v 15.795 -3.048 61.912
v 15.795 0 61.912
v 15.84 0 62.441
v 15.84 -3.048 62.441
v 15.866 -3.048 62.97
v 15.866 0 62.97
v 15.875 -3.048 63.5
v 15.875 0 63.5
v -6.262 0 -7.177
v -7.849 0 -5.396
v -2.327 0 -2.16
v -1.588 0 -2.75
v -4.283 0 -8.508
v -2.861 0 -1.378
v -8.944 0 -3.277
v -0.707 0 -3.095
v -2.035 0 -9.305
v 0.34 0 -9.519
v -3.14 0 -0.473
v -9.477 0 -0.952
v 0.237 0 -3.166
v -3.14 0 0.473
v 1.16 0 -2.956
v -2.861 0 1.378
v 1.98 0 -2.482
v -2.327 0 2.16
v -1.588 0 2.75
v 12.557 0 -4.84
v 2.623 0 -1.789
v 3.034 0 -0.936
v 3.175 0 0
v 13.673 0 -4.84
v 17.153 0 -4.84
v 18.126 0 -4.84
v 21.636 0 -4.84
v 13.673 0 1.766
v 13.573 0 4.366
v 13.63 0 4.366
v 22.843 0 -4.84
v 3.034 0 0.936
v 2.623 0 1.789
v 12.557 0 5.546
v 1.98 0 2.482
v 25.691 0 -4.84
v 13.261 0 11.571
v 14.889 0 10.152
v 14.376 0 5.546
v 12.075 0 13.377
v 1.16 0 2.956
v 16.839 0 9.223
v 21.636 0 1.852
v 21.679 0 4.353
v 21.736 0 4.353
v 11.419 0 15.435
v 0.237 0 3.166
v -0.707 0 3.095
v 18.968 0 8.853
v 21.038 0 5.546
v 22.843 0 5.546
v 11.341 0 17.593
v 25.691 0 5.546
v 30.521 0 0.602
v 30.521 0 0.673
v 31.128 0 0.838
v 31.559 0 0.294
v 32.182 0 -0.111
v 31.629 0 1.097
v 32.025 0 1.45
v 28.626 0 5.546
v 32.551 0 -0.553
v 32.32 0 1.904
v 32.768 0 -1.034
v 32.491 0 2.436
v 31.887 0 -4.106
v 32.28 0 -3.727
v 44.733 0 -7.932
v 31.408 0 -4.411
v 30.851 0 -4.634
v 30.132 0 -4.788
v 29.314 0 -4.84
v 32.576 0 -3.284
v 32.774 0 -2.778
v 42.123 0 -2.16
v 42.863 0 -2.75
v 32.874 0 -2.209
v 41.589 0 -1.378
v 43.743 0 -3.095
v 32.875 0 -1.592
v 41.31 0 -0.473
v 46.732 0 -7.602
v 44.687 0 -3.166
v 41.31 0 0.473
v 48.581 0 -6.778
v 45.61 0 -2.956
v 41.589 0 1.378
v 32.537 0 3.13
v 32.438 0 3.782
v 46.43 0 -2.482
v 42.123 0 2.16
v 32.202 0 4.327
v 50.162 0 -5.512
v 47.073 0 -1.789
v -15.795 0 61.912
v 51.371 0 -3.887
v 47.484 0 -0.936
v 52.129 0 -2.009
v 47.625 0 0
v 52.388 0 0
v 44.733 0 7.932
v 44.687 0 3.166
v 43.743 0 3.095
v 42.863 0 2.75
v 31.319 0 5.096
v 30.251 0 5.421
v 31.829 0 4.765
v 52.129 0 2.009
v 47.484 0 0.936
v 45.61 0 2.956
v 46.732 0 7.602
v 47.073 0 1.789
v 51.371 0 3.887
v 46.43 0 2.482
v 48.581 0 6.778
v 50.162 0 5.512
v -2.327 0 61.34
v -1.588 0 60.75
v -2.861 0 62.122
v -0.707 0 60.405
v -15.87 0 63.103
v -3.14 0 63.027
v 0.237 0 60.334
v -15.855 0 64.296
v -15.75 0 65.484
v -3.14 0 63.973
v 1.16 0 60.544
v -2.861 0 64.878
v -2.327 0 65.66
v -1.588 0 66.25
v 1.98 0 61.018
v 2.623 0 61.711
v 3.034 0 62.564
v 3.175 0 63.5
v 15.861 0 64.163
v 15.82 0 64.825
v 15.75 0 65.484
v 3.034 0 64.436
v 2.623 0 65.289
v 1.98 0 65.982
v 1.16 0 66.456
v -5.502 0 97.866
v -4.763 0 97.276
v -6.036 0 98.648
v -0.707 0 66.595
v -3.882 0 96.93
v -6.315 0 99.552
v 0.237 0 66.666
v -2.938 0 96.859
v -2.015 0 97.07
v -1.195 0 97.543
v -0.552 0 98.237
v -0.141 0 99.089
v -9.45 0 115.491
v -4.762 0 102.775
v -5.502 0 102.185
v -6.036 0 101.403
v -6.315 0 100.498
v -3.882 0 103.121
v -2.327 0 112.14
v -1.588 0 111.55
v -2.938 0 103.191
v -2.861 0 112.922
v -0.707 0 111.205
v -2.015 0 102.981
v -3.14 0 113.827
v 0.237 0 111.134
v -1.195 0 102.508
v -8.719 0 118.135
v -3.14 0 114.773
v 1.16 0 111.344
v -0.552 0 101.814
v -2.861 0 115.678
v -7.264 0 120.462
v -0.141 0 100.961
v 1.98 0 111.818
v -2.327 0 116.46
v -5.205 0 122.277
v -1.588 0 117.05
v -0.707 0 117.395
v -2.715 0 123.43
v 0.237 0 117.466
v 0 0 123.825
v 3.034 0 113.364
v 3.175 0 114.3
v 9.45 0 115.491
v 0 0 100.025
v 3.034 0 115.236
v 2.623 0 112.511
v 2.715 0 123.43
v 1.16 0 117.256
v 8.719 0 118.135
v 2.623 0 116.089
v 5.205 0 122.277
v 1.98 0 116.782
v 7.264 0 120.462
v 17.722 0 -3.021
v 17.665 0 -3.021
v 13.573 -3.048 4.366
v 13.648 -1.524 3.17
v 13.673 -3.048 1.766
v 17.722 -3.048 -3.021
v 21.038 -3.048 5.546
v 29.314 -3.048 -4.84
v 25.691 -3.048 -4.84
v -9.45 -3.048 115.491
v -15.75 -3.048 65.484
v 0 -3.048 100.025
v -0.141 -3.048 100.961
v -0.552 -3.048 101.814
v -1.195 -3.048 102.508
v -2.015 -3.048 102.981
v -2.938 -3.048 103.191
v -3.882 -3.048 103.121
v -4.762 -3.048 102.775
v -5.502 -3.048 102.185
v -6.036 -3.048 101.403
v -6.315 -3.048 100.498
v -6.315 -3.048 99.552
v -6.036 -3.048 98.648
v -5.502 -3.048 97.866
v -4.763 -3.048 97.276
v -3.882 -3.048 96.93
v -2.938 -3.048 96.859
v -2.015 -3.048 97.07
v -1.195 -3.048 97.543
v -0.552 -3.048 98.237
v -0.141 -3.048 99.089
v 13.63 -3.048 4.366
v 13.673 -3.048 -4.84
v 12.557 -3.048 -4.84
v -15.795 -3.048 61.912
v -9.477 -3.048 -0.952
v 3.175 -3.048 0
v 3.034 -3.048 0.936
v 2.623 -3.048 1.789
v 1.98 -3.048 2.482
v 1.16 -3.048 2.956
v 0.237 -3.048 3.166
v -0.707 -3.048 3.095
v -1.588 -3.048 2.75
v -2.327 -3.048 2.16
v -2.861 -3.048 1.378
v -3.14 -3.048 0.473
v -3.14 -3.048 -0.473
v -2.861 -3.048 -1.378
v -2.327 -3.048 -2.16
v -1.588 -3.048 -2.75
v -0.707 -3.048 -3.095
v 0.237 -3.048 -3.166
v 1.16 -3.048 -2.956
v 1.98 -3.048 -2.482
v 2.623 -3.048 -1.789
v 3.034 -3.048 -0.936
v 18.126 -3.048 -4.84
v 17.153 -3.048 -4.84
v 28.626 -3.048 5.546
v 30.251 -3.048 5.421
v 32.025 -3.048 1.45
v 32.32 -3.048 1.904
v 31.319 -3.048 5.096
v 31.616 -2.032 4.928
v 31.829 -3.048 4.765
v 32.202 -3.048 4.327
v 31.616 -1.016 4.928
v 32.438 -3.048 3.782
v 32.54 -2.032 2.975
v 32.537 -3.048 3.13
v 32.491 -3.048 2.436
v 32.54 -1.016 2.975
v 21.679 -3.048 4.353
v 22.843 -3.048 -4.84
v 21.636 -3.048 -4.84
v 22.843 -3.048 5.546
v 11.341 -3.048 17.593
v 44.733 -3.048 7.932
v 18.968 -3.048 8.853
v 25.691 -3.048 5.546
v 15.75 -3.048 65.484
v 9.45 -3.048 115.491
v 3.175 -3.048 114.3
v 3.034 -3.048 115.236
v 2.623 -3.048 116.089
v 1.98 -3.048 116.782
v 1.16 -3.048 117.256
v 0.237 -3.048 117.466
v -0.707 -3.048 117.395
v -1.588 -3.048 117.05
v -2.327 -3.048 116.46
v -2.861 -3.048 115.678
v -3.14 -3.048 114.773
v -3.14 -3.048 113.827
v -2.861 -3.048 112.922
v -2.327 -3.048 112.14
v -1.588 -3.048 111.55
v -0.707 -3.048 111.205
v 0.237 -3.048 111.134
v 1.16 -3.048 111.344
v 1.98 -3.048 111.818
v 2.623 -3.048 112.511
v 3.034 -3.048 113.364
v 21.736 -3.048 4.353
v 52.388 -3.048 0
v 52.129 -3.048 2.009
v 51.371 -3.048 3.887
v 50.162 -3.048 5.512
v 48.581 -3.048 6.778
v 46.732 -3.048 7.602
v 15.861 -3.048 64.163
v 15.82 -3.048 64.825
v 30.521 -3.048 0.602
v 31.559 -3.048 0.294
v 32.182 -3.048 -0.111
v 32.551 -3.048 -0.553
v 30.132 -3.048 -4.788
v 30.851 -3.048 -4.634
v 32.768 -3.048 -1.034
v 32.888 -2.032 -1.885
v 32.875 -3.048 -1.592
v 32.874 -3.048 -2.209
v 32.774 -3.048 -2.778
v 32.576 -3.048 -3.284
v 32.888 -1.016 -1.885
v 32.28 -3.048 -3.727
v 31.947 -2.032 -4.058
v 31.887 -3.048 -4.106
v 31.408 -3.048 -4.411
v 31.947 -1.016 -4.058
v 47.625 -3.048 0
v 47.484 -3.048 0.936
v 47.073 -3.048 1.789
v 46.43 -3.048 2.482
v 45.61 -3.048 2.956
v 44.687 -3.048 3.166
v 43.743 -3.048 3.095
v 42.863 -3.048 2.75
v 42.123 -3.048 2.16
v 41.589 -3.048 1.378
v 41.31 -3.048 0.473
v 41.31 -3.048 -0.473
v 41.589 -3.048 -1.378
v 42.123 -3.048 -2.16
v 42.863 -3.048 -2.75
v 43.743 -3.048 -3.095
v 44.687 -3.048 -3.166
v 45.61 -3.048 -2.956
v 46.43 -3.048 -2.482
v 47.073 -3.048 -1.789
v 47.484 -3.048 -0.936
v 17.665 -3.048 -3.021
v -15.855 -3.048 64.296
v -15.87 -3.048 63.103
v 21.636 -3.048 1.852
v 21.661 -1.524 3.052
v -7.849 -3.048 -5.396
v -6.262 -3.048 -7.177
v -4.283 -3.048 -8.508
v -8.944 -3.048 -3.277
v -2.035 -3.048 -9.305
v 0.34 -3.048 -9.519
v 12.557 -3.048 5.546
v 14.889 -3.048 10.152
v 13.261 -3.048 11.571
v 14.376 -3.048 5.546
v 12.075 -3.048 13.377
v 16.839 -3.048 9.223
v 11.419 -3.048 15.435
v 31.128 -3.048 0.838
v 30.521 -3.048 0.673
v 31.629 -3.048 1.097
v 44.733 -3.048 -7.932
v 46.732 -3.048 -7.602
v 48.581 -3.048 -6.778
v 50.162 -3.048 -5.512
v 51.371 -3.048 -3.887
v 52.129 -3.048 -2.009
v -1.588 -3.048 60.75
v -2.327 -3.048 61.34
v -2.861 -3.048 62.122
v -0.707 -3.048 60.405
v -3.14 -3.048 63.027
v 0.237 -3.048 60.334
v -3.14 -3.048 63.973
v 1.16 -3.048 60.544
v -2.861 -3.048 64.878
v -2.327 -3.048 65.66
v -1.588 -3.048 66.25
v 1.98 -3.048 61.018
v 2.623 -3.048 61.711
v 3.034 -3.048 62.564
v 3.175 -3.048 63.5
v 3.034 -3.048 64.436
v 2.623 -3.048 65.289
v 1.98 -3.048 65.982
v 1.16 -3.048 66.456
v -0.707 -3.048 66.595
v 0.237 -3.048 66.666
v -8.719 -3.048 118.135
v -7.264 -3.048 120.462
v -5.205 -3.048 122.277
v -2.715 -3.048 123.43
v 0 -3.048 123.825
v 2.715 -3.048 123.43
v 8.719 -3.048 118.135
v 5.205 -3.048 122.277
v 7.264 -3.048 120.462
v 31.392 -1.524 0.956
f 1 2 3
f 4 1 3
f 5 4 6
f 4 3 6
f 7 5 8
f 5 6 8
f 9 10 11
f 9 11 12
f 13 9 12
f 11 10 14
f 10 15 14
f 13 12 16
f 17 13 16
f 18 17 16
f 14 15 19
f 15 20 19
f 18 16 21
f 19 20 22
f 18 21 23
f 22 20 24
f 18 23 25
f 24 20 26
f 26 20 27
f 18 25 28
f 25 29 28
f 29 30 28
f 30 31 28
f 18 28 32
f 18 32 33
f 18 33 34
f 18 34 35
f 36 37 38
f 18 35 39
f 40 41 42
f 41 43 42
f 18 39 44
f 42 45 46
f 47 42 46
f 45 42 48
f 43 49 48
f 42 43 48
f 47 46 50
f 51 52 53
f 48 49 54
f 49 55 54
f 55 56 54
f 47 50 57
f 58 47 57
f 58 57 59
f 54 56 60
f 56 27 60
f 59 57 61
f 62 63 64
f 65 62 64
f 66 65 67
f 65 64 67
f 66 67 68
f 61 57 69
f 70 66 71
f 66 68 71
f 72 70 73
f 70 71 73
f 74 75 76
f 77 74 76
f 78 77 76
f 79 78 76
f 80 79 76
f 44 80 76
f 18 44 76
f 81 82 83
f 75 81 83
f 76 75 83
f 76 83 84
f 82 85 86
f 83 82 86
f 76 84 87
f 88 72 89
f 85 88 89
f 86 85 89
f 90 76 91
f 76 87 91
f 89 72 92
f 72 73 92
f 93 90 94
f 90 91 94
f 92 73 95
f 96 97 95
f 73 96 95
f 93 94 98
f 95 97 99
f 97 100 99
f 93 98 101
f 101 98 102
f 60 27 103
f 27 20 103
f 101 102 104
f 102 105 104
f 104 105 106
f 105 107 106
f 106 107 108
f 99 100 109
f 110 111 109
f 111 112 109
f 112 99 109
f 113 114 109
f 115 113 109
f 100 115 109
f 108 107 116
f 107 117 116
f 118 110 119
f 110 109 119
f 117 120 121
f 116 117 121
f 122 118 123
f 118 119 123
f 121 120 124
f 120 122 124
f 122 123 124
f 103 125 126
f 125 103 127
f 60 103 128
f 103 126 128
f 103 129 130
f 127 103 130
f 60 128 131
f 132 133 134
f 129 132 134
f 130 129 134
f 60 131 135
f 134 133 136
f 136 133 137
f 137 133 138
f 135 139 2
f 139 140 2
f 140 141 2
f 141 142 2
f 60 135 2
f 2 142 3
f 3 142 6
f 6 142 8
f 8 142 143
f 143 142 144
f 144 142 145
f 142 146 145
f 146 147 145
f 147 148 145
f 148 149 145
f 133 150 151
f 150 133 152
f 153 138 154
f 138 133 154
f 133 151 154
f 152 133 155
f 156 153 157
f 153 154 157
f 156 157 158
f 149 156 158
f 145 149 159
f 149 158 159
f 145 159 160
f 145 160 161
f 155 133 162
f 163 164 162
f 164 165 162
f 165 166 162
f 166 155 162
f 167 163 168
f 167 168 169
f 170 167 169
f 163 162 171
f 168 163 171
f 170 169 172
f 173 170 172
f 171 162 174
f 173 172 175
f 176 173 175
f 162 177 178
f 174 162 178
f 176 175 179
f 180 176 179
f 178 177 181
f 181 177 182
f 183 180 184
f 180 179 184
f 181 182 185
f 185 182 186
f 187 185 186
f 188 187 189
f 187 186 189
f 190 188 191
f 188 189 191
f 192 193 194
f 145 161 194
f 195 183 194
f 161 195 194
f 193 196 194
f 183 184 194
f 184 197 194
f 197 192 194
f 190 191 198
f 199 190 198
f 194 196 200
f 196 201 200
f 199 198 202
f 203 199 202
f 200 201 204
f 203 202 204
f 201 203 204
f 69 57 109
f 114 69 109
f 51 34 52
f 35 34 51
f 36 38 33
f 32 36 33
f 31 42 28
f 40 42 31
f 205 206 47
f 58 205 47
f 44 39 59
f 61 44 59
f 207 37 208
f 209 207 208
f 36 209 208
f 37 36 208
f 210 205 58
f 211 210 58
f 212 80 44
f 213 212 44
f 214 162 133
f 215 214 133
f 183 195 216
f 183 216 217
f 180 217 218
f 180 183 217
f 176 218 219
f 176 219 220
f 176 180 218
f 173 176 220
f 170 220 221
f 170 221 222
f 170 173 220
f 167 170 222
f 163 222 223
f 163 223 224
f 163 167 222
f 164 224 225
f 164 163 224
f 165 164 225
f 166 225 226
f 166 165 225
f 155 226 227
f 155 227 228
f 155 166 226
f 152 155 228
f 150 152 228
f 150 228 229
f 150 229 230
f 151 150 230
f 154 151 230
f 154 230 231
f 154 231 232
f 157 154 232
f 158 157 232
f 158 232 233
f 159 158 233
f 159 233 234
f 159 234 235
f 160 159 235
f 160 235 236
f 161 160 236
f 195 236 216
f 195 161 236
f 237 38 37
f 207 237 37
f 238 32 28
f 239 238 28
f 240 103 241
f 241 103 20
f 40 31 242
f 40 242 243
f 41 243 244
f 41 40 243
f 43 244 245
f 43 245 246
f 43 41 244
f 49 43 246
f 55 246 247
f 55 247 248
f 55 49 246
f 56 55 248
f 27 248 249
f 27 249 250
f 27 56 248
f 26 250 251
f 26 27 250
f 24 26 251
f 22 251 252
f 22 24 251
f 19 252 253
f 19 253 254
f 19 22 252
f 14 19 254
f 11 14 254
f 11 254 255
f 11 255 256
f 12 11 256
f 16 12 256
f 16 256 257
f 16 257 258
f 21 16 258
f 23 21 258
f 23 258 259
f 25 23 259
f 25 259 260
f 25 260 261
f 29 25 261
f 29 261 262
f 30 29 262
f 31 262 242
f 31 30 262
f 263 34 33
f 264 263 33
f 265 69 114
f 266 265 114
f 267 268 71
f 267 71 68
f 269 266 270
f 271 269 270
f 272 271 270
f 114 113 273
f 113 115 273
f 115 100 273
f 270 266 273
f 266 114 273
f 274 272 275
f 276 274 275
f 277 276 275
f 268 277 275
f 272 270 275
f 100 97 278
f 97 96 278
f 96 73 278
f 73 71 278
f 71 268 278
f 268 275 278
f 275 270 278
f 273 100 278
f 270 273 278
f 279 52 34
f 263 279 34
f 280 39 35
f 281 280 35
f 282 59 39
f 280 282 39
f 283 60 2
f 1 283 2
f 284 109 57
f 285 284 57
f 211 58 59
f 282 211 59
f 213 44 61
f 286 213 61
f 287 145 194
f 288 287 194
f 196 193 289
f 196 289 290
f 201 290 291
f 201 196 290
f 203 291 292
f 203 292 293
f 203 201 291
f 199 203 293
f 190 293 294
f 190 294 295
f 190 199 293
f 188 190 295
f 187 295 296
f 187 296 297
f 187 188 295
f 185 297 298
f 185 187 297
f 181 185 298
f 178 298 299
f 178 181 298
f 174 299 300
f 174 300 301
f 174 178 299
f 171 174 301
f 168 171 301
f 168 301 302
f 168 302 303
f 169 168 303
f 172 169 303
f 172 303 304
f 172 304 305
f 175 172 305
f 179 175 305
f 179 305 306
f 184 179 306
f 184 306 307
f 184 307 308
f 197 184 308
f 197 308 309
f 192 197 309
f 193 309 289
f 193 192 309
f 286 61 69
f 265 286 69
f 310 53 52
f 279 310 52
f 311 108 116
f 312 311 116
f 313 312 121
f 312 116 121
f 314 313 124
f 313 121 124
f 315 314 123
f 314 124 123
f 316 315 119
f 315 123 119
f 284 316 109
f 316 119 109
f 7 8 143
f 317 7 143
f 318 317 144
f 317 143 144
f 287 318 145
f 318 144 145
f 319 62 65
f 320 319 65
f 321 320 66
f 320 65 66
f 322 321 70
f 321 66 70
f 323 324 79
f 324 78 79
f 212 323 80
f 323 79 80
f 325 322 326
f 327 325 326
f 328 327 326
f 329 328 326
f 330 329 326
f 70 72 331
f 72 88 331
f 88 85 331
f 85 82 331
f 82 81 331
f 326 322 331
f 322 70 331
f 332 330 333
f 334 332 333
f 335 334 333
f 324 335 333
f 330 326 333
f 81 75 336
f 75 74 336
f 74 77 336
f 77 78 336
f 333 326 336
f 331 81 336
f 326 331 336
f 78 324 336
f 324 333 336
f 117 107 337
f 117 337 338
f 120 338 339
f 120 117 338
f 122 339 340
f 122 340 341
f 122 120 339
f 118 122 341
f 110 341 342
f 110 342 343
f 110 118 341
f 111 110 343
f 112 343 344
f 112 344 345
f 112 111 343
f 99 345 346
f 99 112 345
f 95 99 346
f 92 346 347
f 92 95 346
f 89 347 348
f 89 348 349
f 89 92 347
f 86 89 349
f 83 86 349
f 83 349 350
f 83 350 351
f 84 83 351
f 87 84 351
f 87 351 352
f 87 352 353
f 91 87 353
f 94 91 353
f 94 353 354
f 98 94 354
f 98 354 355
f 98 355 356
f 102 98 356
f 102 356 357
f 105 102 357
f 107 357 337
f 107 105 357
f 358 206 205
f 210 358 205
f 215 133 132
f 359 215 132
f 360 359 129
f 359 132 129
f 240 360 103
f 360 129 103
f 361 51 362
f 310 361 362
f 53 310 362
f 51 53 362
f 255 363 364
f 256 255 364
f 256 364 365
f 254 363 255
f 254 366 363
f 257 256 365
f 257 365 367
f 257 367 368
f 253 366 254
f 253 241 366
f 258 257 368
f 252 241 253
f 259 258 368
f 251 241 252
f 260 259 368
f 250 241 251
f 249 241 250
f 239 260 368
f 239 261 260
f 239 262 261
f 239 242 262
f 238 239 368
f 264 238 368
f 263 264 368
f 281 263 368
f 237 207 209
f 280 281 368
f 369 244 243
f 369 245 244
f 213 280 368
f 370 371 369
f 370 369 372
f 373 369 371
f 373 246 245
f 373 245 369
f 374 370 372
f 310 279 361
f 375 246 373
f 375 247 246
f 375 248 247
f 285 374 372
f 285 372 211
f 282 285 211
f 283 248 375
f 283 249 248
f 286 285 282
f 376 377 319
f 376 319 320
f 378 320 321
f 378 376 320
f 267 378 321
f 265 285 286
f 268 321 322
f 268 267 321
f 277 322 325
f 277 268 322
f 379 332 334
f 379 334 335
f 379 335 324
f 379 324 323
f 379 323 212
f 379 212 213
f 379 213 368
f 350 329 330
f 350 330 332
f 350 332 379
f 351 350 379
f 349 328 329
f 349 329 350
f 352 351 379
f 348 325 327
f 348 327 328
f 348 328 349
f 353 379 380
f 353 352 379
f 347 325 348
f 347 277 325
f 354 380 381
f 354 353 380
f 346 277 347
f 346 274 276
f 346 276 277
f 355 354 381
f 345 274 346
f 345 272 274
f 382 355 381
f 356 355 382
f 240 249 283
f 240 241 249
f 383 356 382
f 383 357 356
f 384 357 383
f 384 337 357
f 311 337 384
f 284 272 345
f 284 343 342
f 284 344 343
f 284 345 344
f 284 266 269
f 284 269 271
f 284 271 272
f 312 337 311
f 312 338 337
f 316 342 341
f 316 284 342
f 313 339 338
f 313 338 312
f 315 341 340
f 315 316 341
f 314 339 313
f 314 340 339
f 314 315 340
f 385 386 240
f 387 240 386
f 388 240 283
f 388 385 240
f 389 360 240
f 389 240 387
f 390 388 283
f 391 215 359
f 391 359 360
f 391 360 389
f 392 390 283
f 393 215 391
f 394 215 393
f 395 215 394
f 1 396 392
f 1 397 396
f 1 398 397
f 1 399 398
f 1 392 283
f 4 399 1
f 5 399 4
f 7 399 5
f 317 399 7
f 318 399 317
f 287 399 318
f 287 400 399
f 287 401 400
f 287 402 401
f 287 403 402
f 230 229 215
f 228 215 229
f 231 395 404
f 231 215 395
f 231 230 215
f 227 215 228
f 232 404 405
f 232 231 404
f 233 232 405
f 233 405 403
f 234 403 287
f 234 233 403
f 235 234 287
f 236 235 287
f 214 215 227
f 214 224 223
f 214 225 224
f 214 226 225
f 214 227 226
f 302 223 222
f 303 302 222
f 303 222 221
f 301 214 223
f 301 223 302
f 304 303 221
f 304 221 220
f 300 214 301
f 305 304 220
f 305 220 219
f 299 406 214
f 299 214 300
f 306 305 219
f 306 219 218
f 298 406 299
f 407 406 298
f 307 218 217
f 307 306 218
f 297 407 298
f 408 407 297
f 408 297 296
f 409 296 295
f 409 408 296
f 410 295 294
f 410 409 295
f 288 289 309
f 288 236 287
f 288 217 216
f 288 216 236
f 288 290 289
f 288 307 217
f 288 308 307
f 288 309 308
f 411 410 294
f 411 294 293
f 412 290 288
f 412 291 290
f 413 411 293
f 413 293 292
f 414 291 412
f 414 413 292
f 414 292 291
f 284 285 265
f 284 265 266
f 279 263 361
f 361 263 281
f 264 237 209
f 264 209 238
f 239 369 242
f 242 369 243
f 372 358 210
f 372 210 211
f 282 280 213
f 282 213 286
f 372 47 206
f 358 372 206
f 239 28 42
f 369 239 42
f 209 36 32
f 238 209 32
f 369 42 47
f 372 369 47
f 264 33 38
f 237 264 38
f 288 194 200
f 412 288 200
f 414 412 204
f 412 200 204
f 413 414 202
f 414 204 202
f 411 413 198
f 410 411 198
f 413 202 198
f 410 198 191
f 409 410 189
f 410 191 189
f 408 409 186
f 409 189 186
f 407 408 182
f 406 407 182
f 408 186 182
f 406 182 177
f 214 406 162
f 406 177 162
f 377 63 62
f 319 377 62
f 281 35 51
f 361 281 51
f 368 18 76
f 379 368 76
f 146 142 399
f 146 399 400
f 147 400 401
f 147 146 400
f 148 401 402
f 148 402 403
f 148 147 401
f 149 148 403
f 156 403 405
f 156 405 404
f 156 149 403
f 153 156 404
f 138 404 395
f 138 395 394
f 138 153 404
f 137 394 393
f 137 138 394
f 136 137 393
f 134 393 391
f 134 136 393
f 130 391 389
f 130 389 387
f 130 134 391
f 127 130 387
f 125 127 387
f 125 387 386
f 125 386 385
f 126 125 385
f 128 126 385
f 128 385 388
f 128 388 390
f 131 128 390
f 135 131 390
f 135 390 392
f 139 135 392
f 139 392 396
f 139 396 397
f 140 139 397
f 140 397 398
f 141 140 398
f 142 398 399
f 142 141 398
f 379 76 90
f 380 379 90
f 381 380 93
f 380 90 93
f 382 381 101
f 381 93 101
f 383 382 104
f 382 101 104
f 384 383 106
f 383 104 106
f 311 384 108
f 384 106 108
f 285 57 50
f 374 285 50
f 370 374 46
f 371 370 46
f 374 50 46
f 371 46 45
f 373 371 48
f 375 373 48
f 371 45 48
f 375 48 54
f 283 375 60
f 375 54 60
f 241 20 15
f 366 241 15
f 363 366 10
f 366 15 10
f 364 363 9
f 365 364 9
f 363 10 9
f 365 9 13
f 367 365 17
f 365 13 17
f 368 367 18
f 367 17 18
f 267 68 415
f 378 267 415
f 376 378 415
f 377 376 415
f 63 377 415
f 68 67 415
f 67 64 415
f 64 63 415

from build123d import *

# Parameters (mm, degrees)
F0_R     = 3.175
F1_DEPTH = 3.048


with BuildPart() as f1:
    # F0 (on Front) → F1 (new body)
    with BuildSketch(Plane.XZ):
        with BuildLine():
            ThreePointArc((44.7334821429, -7.9324362036), (50.1620069047, -5.5115227815), (52.3875, 0))
            ThreePointArc((52.3875, 0), (50.1620069047, 5.5115227815), (44.7334821429, 7.9324362036))
            ThreePointArc((44.7334821429, 7.9324362036), (36.5125, 0), (44.7334821429, -7.9324362036))
        make_face()
        with Locations((44.45, 0)):
            Circle(F0_R, mode=Mode.SUBTRACT)
        with BuildLine():
            ThreePointArc((-9.4772553384, -0.9525), (-6.2623833816, -7.1769199091), (0.3401785714, -9.5189234444))
            ThreePointArc((0.3401785714, -9.5189234444), (6.8544082857, -6.6138273378), (9.525, 0))
            ThreePointArc((9.525, 0), (-0.4768479324, 9.5130563464), (-9.4772553384, -0.9525))
        make_face()
        Circle(F0_R, mode=Mode.SUBTRACT)
        with BuildLine():
            ThreePointArc((9.4502929642, 115.490625), (0, 123.825), (-9.4502929642, 115.490625))
            ThreePointArc((-9.4502929642, 115.490625), (-0.596483242, 104.7936951058), (9.525, 114.3))
            ThreePointArc((9.525, 114.3), (9.5063048942, 114.896483242), (9.4502929642, 115.490625))
        make_face()
        with Locations((0, 114.3)):
            Circle(F0_R, mode=Mode.SUBTRACT)
        with BuildLine():
            Line((-9.4502929642, 115.490625), (-15.7504882737, 65.484375))
            ThreePointArc((-15.7504882737, 65.484375), (0, 79.375), (15.7504882737, 65.484375))
            Line((15.7504882737, 65.484375), (9.4502929642, 115.490625))
            ThreePointArc((9.4502929642, 115.490625), (9.5063048942, 114.896483242), (9.525, 114.3))
            ThreePointArc((9.525, 114.3), (-0.596483242, 104.7936951058), (-9.4502929642, 115.490625))
        make_face()
        with Locations((-3.175, 100.0252)):
            Circle(F0_R, mode=Mode.SUBTRACT)
        with BuildLine():
            ThreePointArc((-15.7954255641, 61.9125), (0, 47.625), (15.7954255641, 61.9125))
            ThreePointArc((15.7954255641, 61.9125), (15.8550939106, 62.7052534459), (15.875, 63.5))
            ThreePointArc((15.875, 63.5), (15.8438414904, 64.4941387366), (15.7504882737, 65.484375))
            ThreePointArc((15.7504882737, 65.484375), (0, 79.375), (-15.7504882737, 65.484375))
            ThreePointArc((-15.7504882737, 65.484375), (-15.8737438155, 63.6997054867), (-15.7954255641, 61.9125))
        make_face()
        with Locations((0, 63.5)):
            Circle(F0_R, mode=Mode.SUBTRACT)
        with BuildLine():
            ThreePointArc((44.7334821429, -7.9324362036), (36.5125, 0), (44.7334821429, 7.9324362036))
            Line((44.7334821429, 7.9324362036), (18.9676000005, 8.8532337108))
            ThreePointArc((18.9676000005, 8.8532337108), (13.2611998974, 11.5713591498), (11.3411865923, 17.5933818124))
            Line((11.3411865923, 17.5933818124), (15.7954255641, 61.9125))
            ThreePointArc((15.7954255641, 61.9125), (0, 47.625), (-15.7954255641, 61.9125))
            Line((-15.7954255641, 61.9125), (-9.4772553384, -0.9525))
            ThreePointArc((-9.4772553384, -0.9525), (-0.4768479324, 9.5130563464), (9.525, 0))
            ThreePointArc((9.525, 0), (6.8544082857, -6.6138273378), (0.3401785714, -9.5189234444))
            Line((0.3401785714, -9.5189234444), (44.7334821429, -7.9324362036))
        make_face()
        with BuildLine():
            Line((18.1261931211, -4.8397090286), (17.1533066209, -4.8397090286))
            Line((17.1533066209, -4.8397090286), (13.6300027063, 4.3663431352))
            Line((13.6300027063, 4.3663431352), (13.5731752238, 4.3663431352))
            add(Edge.make_bspline(
                [(13.5731752238, 4.3663431352), (13.673191593, 3.272982372), (13.673191593, 1.7659175363)],
                knots=[0, 0, 0, 1, 1, 1], degree=2))
            Line((13.673191593, 1.7659175363), (13.673191593, -4.8397090286))
            Line((13.673191593, -4.8397090286), (12.5570998369, -4.8397090286))
            Line((12.5570998369, -4.8397090286), (12.5570998369, 5.5460816717))
            Line((12.5570998369, 5.5460816717), (14.3755792766, 5.5460816717))
            Line((14.3755792766, 5.5460816717), (17.6647539633, -3.0212295888))
            Line((17.6647539633, -3.0212295888), (17.7215814458, -3.0212295888))
            Line((17.7215814458, -3.0212295888), (21.0380333241, 5.5460816717))
            Line((21.0380333241, 5.5460816717), (22.842874168, 5.5460816717))
            Line((22.842874168, 5.5460816717), (22.842874168, -4.8397090286))
            Line((22.842874168, -4.8397090286), (21.6358584399, -4.8397090286))
            Line((21.6358584399, -4.8397090286), (21.6358584399, 1.8522953097))
            add(Edge.make_bspline(
                [(21.6358584399, 1.8522953097), (21.6358584399, 3.0024835554), (21.7358748091, 4.3527045394)],
                knots=[0, 0, 0, 1, 1, 1], degree=2))
            Line((21.7358748091, 4.3527045394), (21.6790473266, 4.3527045394))
            Line((21.6790473266, 4.3527045394), (18.1261931211, -4.8397090286))
        make_face(mode=Mode.SUBTRACT)
        with BuildLine():
            Line((25.6910675905, -4.8397090286), (25.6910675905, 5.5460816717))
            Line((25.6910675905, 5.5460816717), (28.6256387865, 5.5460816717))
            add(Edge.make_bspline(
                [(28.6256387865, 5.5460816717), (30.6918860499, 5.5460816717), (31.6159009152, 4.9277986622)],
                knots=[0, 0, 0, 1, 1, 1], degree=2))
            add(Edge.make_bspline(
                [(31.6159009152, 4.9277986622), (32.5399157805, 4.3095156527), (32.5399157805, 2.9752063638)],
                knots=[0, 0, 0, 1, 1, 1], degree=2))
            add(Edge.make_bspline(
                [(32.5399157805, 2.9752063638), (32.5399157805, 2.0500549488), (32.0250587892, 1.4499567337)],
                knots=[0, 0, 0, 1, 1, 1], degree=2))
            add(Edge.make_bspline(
                [(32.0250587892, 1.4499567337), (31.5102017978, 0.8498585186), (30.5214036024, 0.6725567732)],
                knots=[0, 0, 0, 1, 1, 1], degree=2))
            Line((30.5214036024, 0.6725567732), (30.5214036024, 0.6020906949))
            add(Edge.make_bspline(
                [(30.5214036024, 0.6020906949), (32.8876999734, 0.1974790195), (32.8876999734, -1.884679939)],
                knots=[0, 0, 0, 1, 1, 1], degree=2))
            add(Edge.make_bspline(
                [(32.8876999734, -1.884679939), (32.8876999734, -3.2758167104), (31.9466368633, -4.0577628695)],
                knots=[0, 0, 0, 1, 1, 1], degree=2))
            add(Edge.make_bspline(
                [(31.9466368633, -4.0577628695), (31.0055737532, -4.8397090286), (29.3143878743, -4.8397090286)],
                knots=[0, 0, 0, 1, 1, 1], degree=2))
            Line((29.3143878743, -4.8397090286), (25.6910675905, -4.8397090286))
        make_face(mode=Mode.SUBTRACT)
    extrude(amount=F1_DEPTH)


solid = f1.part
